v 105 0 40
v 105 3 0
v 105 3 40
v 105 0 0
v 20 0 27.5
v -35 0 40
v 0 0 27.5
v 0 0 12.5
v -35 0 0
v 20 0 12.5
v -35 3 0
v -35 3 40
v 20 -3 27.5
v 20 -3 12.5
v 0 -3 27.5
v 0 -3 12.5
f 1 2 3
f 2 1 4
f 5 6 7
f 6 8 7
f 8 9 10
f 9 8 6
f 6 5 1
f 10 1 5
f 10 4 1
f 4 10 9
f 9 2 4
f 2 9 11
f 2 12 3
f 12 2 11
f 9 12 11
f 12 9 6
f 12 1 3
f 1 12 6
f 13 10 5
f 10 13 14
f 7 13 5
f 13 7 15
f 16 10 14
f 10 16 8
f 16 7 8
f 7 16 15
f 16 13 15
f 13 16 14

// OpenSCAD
union() {
	hull() {
		translate(v = [-35.0000000000, 0, 0]) {
			cube(size = [70.0000000000, 3, 40]);
		}
		translate(v = [35.0000000000, 0, 0]) {
			cube(size = [70.0000000000, 3, 40]);
		}
	}
	translate(v = [0, -3, 12.5000000000]) {
		cube(size = [20, 6, 15]);
	}
}
